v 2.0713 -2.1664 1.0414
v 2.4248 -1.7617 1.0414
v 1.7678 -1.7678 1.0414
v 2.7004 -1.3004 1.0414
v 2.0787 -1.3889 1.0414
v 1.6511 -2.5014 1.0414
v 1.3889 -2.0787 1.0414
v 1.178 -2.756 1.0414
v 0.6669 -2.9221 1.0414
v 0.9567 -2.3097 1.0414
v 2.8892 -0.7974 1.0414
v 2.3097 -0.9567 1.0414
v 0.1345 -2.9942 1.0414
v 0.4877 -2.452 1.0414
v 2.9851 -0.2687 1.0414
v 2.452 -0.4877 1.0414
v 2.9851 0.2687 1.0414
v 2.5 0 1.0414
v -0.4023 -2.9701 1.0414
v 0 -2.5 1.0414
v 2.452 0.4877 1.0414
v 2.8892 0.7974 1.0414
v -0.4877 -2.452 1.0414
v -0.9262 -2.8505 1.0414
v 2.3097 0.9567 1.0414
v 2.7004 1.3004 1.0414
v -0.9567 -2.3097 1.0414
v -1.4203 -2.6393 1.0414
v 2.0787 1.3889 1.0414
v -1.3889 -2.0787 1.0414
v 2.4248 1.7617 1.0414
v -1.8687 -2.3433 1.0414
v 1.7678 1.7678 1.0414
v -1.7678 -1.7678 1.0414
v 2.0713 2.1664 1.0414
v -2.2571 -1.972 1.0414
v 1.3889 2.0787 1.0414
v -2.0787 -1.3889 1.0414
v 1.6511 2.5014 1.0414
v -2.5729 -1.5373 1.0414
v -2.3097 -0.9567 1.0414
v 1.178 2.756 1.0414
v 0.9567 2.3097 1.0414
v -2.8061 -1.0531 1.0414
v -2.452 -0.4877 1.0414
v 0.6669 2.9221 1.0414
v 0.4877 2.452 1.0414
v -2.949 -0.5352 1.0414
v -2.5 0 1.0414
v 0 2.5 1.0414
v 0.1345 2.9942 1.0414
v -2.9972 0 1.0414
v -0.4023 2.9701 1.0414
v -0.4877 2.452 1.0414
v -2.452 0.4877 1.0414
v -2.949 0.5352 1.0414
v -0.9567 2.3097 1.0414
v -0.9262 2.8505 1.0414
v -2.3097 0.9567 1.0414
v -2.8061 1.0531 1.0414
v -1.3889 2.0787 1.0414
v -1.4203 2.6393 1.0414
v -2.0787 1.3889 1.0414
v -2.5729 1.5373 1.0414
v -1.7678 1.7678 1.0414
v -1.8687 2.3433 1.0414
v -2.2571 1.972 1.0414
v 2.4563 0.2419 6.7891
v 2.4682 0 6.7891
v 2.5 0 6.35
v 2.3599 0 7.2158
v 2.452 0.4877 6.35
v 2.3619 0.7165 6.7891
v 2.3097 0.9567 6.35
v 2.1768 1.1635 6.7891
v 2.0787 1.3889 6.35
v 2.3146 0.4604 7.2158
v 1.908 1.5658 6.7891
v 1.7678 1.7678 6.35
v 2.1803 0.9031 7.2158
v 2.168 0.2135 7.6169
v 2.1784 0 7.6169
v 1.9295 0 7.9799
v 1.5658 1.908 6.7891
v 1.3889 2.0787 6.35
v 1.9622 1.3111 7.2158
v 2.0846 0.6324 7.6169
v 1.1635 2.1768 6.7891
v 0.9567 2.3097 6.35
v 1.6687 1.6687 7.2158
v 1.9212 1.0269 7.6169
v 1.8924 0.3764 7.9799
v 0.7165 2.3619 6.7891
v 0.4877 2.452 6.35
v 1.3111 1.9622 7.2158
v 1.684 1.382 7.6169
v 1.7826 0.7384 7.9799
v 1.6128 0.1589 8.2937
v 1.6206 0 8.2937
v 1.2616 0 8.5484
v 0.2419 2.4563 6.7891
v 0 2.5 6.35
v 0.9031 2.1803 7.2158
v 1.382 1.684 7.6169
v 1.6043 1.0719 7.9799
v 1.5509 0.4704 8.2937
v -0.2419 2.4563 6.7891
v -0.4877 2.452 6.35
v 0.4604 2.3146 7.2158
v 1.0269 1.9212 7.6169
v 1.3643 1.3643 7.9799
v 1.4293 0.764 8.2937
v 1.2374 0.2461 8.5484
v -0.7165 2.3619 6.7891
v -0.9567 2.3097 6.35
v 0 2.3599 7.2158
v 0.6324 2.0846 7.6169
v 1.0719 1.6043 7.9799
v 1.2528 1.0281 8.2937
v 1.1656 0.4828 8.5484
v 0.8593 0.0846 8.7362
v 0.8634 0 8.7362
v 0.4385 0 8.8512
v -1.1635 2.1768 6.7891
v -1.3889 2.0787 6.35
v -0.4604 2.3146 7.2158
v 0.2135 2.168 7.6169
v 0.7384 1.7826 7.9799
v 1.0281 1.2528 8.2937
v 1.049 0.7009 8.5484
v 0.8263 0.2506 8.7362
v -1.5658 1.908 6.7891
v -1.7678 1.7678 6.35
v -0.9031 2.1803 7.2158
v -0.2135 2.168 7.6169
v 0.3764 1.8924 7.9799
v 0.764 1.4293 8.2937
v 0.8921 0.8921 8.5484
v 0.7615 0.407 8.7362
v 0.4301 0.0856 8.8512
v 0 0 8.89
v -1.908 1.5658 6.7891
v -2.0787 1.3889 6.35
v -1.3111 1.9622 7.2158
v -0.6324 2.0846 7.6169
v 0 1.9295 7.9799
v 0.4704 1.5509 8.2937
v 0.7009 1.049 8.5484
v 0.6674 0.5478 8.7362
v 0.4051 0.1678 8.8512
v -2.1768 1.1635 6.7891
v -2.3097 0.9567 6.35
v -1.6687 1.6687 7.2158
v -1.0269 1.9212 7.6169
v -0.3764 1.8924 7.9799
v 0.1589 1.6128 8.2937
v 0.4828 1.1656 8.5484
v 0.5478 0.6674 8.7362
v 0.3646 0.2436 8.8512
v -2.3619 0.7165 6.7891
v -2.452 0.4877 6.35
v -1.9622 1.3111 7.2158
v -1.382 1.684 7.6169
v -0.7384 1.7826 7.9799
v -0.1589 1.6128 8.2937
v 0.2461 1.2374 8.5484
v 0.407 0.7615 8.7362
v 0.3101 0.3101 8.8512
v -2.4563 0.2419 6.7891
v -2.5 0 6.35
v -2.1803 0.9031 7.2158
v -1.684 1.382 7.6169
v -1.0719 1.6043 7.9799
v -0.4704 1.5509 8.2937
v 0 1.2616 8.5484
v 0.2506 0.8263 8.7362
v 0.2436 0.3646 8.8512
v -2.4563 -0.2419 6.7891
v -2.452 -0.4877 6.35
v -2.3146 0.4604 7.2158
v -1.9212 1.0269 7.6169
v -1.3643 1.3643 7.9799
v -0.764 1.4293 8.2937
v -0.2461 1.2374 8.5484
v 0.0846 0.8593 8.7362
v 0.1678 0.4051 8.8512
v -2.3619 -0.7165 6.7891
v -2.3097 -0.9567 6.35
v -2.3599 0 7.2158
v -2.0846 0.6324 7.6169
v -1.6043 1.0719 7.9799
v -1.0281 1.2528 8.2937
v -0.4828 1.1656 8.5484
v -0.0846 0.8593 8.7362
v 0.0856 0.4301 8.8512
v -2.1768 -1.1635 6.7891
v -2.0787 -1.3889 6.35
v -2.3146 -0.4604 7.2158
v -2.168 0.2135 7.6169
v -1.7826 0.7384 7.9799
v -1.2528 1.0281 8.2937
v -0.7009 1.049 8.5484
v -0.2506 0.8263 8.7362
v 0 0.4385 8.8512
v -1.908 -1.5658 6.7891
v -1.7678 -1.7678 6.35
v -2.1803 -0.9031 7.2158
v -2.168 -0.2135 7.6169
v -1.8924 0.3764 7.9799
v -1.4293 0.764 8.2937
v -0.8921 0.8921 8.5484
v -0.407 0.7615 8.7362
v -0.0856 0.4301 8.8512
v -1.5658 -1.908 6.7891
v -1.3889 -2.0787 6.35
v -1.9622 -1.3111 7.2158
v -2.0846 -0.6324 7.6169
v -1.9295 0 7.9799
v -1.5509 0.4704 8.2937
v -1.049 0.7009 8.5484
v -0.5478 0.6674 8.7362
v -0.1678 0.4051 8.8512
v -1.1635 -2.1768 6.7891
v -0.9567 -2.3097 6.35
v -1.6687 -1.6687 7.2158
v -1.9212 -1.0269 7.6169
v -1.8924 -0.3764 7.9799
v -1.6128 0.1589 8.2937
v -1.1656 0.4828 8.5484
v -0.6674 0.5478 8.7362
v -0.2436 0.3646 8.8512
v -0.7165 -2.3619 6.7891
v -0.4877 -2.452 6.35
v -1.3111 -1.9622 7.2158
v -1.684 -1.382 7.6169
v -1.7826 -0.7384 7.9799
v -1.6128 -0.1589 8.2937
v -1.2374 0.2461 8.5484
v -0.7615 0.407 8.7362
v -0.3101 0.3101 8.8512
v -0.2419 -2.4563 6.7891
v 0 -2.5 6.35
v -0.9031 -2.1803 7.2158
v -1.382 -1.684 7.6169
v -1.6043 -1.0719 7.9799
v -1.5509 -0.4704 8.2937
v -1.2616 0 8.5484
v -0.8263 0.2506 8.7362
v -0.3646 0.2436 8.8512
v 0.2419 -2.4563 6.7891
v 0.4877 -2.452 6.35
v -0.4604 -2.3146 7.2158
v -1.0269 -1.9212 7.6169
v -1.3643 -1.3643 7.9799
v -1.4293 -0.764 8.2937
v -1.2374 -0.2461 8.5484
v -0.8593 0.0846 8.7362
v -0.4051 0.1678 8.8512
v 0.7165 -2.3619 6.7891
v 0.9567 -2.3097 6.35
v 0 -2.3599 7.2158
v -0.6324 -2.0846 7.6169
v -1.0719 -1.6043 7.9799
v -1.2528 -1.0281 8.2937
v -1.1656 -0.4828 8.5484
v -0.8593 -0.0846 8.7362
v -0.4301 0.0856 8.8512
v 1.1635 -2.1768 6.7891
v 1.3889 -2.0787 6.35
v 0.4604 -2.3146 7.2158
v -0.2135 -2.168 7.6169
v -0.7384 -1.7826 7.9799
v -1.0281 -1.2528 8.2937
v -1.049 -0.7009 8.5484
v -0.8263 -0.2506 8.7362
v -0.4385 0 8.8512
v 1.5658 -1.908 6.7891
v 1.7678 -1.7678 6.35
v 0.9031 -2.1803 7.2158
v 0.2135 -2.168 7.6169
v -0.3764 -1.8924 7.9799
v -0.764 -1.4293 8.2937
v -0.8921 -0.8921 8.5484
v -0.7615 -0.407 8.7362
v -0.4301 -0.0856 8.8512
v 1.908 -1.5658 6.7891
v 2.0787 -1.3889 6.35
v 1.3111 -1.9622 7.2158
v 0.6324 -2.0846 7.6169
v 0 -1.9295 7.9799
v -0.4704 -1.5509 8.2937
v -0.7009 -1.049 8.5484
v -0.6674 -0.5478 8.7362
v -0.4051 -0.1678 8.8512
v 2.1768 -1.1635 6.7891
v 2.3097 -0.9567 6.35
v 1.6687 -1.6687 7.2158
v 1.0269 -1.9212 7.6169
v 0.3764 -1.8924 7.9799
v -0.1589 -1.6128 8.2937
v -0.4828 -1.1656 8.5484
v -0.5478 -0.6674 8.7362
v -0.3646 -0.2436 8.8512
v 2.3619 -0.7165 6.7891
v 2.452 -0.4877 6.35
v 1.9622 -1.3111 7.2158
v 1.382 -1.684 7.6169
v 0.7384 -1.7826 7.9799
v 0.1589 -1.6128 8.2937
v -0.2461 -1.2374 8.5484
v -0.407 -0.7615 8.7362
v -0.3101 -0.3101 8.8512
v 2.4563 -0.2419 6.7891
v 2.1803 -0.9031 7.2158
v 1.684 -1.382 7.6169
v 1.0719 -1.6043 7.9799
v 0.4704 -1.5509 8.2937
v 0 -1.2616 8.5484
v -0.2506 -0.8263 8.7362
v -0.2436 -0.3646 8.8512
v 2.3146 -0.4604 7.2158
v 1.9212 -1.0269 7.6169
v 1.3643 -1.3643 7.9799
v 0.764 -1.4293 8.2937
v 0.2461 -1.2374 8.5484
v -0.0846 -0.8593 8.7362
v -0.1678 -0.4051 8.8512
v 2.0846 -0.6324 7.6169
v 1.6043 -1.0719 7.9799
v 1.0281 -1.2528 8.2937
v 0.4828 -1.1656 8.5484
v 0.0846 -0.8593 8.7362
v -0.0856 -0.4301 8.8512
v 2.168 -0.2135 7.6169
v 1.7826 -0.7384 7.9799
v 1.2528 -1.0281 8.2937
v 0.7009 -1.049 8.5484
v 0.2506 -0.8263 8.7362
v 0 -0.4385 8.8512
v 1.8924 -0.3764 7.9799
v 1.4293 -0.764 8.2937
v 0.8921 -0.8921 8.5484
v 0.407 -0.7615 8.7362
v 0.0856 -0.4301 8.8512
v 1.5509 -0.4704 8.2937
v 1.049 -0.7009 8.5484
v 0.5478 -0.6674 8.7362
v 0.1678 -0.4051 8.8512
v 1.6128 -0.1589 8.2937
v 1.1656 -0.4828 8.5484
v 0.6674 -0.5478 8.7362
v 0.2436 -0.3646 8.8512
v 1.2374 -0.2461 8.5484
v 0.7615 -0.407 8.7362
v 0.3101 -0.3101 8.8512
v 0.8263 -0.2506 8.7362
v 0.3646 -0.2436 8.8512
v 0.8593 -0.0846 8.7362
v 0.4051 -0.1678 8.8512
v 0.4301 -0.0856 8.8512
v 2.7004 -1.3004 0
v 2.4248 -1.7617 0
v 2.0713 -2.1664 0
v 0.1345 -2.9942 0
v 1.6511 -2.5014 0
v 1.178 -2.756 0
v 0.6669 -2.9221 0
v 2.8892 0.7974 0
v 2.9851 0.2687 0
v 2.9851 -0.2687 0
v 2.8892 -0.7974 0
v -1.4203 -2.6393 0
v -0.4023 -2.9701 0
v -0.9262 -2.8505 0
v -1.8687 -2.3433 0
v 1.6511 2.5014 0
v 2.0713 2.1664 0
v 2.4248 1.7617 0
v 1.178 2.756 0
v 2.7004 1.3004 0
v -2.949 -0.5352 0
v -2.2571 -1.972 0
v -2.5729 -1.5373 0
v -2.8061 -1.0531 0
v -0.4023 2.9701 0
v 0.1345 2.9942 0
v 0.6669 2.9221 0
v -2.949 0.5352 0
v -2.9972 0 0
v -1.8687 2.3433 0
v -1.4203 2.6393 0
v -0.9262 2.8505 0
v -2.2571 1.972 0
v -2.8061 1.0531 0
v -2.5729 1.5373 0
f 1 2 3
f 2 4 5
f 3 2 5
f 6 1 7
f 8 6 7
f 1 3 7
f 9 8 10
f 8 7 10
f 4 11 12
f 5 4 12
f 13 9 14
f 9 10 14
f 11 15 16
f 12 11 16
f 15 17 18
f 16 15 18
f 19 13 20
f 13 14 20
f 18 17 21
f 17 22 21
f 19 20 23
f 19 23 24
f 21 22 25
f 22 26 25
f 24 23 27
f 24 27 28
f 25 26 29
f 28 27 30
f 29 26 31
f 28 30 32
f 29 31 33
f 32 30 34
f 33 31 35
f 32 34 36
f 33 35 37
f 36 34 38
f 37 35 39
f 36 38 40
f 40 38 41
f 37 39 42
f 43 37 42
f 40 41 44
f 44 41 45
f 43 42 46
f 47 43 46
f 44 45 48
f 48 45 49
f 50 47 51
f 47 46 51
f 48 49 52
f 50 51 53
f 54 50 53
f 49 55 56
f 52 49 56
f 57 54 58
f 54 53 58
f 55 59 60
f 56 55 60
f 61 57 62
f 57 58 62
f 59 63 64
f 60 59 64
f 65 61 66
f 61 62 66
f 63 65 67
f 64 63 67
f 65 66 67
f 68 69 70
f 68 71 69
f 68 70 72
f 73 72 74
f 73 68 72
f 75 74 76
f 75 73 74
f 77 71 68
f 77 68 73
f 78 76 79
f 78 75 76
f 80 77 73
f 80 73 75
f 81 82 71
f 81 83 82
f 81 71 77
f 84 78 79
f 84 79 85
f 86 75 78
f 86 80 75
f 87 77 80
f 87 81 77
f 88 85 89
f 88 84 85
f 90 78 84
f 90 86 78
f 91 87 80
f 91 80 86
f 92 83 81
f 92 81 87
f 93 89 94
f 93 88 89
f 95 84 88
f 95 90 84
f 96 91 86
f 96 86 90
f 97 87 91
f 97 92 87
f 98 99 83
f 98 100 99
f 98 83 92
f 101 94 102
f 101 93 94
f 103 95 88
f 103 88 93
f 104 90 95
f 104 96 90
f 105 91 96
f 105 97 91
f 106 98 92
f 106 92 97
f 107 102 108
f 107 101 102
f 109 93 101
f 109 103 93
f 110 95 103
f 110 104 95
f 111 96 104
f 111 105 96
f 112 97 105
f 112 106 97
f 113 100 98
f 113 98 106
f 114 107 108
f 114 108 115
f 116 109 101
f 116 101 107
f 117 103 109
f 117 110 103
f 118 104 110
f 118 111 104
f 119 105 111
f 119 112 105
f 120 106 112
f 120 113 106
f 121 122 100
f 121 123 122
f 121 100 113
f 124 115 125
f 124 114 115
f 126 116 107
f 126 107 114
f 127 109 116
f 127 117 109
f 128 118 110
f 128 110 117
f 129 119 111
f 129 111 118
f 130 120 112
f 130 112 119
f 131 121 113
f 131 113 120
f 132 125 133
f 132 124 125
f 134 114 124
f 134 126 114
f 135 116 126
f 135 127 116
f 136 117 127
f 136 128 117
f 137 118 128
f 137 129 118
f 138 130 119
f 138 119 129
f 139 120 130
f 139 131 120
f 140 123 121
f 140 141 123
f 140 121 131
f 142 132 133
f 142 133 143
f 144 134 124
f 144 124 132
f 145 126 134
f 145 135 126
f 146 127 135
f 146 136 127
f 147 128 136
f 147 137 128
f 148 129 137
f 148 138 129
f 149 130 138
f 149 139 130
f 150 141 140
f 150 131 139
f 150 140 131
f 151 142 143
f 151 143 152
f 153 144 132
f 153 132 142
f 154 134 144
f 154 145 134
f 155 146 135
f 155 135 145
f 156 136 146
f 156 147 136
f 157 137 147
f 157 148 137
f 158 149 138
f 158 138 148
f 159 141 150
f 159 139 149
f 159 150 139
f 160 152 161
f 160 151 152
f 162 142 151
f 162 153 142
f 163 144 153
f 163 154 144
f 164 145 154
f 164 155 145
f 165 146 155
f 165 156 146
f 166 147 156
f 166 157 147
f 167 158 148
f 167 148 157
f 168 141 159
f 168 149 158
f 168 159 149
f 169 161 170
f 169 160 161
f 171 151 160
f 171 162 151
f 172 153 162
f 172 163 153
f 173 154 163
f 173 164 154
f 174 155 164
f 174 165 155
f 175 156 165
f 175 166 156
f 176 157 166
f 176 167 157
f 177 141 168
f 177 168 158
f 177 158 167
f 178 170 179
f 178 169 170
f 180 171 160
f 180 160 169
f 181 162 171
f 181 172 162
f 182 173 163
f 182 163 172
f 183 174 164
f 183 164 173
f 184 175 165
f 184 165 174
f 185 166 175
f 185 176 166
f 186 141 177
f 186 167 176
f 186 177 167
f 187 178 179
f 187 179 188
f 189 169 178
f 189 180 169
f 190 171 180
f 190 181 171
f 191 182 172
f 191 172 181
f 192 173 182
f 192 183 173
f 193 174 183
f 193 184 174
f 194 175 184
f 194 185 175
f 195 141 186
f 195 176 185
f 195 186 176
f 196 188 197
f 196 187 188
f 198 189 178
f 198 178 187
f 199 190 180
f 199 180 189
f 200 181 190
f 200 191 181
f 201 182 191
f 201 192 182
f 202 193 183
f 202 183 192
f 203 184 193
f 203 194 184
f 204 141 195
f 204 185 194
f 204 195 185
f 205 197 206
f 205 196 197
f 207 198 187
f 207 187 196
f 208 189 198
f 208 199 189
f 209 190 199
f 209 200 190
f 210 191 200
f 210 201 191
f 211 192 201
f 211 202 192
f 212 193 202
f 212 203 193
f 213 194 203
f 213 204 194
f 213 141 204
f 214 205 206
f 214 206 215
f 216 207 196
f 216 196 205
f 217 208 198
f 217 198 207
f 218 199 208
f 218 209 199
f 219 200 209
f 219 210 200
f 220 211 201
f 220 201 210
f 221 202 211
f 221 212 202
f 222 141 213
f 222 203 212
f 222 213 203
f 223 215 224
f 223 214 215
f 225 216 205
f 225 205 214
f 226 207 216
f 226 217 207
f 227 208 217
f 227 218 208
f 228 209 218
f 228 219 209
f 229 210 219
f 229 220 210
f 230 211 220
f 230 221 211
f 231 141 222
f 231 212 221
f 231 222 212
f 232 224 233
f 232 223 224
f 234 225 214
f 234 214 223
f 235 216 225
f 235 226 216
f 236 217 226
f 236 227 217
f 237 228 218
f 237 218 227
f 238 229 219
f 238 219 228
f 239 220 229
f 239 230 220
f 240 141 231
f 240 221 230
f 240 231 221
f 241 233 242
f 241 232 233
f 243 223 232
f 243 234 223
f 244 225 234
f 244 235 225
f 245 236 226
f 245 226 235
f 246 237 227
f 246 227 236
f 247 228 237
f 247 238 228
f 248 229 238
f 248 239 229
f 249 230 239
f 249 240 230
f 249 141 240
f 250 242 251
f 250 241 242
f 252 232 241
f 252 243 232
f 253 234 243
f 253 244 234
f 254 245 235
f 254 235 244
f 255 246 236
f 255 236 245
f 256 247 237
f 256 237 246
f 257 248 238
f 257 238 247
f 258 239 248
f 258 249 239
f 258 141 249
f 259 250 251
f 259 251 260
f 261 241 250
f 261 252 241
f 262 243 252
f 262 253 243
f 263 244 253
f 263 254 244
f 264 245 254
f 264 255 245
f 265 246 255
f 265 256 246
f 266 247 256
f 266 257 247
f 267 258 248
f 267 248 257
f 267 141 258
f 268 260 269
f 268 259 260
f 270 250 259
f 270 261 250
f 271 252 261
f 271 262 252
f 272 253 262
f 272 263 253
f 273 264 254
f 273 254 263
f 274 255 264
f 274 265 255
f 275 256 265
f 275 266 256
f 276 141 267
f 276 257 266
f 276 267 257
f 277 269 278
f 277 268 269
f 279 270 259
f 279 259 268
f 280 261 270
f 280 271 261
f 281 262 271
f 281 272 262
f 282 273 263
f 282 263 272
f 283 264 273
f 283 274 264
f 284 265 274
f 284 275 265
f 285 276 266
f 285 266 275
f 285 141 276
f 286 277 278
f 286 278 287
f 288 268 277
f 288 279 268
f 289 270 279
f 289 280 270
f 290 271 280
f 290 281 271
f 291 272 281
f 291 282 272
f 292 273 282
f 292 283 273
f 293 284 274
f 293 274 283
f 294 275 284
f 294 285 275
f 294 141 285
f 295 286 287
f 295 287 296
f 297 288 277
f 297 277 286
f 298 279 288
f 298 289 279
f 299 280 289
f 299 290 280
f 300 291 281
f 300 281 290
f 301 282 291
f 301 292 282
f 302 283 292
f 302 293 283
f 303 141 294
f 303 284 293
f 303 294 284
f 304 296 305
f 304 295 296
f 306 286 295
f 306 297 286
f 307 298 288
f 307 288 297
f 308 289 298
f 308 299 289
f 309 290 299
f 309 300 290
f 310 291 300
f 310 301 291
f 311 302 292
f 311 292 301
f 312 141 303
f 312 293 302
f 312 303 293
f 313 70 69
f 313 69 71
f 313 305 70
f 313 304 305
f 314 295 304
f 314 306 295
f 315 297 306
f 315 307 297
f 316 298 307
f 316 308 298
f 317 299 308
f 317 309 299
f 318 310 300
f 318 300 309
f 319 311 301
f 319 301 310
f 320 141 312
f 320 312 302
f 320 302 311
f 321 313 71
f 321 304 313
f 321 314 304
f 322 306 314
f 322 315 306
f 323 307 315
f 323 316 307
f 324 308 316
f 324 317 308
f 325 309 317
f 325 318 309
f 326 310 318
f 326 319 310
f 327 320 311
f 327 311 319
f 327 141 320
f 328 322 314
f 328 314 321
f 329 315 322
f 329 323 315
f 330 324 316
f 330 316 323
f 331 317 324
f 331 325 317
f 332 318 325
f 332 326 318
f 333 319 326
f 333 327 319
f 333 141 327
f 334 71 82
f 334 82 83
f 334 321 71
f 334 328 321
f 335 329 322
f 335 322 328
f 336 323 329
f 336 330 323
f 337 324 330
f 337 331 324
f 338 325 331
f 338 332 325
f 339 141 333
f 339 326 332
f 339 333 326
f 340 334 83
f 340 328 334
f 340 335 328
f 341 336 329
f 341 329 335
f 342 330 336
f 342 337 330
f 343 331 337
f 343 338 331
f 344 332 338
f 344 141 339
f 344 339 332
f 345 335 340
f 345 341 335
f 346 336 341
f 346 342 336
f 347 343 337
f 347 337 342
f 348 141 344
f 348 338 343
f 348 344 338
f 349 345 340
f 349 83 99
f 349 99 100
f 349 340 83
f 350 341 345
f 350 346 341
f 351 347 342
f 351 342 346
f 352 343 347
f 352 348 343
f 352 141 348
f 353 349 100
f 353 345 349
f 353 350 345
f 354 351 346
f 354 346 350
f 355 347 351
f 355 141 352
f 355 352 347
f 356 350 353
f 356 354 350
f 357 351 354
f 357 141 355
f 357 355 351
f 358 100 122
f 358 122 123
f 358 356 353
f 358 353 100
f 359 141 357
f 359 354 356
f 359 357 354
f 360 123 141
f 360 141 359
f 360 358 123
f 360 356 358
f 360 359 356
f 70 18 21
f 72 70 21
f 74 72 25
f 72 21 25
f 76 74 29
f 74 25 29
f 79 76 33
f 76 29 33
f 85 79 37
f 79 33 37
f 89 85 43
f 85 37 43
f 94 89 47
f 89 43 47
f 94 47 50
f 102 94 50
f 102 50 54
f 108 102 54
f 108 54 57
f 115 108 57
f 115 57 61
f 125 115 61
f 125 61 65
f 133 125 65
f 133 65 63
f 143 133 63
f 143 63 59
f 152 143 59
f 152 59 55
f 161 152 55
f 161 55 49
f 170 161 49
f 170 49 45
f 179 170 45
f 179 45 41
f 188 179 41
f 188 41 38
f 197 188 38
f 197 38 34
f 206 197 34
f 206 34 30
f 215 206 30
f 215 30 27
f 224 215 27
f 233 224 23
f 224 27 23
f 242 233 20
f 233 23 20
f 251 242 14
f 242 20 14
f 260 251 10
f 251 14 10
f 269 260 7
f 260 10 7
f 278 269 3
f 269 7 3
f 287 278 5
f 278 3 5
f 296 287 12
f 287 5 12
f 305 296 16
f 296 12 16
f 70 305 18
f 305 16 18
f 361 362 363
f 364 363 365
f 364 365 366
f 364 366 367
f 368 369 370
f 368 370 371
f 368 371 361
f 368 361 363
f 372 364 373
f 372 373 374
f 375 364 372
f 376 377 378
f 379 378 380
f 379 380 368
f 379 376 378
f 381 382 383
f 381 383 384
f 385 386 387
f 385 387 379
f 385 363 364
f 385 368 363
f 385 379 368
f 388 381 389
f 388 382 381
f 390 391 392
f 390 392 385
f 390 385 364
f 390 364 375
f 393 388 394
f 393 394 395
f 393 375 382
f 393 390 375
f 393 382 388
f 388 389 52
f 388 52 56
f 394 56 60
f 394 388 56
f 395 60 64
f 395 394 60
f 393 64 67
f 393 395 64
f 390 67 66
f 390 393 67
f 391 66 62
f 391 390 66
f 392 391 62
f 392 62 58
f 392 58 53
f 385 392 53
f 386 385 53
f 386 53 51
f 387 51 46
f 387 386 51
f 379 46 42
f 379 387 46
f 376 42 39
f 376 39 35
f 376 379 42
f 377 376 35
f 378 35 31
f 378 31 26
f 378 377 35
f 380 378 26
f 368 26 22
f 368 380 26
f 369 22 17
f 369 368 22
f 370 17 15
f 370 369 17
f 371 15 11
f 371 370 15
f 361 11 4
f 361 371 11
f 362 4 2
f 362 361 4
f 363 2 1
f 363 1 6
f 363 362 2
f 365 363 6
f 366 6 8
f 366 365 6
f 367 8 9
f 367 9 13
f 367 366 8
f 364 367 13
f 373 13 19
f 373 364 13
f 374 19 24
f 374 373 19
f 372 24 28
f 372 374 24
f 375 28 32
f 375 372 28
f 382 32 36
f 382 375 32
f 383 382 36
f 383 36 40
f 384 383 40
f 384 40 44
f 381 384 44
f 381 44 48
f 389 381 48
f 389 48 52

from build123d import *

# Parameters (mm, degrees)
SKETCH1_R           = 2.5
BOSS_EXTRUDE1_DEPTH = 6.35
DOME1_FACE_RADIUS   = 2.5
DOME1_HEIGHT        = 2.54
SKETCH3_R           = 2.9972
BOSS_EXTRUDE2_DEPTH = 1.0414


with BuildPart() as part:
    # Sketch1 → Boss-Extrude1 (new body)
    with BuildSketch(Plane.XY):
        Circle(SKETCH1_R)
    extrude(amount=BOSS_EXTRUDE1_DEPTH)

    # Dome1: a dome of height H over a round flat face of radius A is a cap of a sphere of radius (A * A + H * H) / (2 * H)
    dome1_r = (DOME1_FACE_RADIUS * DOME1_FACE_RADIUS + DOME1_HEIGHT * DOME1_HEIGHT) / (2 * DOME1_HEIGHT)
    dome1_base = Plane((0, 0, 6.35), z_dir=(0, 0, 1))
    with Locations(dome1_base.offset(DOME1_HEIGHT - dome1_r)):
        dome1_ball = Sphere(dome1_r, mode=Mode.PRIVATE)
    add(split(dome1_ball, bisect_by=dome1_base, keep=Keep.TOP, mode=Mode.PRIVATE))

    # Sketch3 → Boss-Extrude2 (add)
    with BuildSketch(Plane(origin=(0, 0, 0), x_dir=(-1, 0, 0), z_dir=(0, 0, -1))):
        Circle(SKETCH3_R)
    extrude(amount=-BOSS_EXTRUDE2_DEPTH)


solid = part.part
